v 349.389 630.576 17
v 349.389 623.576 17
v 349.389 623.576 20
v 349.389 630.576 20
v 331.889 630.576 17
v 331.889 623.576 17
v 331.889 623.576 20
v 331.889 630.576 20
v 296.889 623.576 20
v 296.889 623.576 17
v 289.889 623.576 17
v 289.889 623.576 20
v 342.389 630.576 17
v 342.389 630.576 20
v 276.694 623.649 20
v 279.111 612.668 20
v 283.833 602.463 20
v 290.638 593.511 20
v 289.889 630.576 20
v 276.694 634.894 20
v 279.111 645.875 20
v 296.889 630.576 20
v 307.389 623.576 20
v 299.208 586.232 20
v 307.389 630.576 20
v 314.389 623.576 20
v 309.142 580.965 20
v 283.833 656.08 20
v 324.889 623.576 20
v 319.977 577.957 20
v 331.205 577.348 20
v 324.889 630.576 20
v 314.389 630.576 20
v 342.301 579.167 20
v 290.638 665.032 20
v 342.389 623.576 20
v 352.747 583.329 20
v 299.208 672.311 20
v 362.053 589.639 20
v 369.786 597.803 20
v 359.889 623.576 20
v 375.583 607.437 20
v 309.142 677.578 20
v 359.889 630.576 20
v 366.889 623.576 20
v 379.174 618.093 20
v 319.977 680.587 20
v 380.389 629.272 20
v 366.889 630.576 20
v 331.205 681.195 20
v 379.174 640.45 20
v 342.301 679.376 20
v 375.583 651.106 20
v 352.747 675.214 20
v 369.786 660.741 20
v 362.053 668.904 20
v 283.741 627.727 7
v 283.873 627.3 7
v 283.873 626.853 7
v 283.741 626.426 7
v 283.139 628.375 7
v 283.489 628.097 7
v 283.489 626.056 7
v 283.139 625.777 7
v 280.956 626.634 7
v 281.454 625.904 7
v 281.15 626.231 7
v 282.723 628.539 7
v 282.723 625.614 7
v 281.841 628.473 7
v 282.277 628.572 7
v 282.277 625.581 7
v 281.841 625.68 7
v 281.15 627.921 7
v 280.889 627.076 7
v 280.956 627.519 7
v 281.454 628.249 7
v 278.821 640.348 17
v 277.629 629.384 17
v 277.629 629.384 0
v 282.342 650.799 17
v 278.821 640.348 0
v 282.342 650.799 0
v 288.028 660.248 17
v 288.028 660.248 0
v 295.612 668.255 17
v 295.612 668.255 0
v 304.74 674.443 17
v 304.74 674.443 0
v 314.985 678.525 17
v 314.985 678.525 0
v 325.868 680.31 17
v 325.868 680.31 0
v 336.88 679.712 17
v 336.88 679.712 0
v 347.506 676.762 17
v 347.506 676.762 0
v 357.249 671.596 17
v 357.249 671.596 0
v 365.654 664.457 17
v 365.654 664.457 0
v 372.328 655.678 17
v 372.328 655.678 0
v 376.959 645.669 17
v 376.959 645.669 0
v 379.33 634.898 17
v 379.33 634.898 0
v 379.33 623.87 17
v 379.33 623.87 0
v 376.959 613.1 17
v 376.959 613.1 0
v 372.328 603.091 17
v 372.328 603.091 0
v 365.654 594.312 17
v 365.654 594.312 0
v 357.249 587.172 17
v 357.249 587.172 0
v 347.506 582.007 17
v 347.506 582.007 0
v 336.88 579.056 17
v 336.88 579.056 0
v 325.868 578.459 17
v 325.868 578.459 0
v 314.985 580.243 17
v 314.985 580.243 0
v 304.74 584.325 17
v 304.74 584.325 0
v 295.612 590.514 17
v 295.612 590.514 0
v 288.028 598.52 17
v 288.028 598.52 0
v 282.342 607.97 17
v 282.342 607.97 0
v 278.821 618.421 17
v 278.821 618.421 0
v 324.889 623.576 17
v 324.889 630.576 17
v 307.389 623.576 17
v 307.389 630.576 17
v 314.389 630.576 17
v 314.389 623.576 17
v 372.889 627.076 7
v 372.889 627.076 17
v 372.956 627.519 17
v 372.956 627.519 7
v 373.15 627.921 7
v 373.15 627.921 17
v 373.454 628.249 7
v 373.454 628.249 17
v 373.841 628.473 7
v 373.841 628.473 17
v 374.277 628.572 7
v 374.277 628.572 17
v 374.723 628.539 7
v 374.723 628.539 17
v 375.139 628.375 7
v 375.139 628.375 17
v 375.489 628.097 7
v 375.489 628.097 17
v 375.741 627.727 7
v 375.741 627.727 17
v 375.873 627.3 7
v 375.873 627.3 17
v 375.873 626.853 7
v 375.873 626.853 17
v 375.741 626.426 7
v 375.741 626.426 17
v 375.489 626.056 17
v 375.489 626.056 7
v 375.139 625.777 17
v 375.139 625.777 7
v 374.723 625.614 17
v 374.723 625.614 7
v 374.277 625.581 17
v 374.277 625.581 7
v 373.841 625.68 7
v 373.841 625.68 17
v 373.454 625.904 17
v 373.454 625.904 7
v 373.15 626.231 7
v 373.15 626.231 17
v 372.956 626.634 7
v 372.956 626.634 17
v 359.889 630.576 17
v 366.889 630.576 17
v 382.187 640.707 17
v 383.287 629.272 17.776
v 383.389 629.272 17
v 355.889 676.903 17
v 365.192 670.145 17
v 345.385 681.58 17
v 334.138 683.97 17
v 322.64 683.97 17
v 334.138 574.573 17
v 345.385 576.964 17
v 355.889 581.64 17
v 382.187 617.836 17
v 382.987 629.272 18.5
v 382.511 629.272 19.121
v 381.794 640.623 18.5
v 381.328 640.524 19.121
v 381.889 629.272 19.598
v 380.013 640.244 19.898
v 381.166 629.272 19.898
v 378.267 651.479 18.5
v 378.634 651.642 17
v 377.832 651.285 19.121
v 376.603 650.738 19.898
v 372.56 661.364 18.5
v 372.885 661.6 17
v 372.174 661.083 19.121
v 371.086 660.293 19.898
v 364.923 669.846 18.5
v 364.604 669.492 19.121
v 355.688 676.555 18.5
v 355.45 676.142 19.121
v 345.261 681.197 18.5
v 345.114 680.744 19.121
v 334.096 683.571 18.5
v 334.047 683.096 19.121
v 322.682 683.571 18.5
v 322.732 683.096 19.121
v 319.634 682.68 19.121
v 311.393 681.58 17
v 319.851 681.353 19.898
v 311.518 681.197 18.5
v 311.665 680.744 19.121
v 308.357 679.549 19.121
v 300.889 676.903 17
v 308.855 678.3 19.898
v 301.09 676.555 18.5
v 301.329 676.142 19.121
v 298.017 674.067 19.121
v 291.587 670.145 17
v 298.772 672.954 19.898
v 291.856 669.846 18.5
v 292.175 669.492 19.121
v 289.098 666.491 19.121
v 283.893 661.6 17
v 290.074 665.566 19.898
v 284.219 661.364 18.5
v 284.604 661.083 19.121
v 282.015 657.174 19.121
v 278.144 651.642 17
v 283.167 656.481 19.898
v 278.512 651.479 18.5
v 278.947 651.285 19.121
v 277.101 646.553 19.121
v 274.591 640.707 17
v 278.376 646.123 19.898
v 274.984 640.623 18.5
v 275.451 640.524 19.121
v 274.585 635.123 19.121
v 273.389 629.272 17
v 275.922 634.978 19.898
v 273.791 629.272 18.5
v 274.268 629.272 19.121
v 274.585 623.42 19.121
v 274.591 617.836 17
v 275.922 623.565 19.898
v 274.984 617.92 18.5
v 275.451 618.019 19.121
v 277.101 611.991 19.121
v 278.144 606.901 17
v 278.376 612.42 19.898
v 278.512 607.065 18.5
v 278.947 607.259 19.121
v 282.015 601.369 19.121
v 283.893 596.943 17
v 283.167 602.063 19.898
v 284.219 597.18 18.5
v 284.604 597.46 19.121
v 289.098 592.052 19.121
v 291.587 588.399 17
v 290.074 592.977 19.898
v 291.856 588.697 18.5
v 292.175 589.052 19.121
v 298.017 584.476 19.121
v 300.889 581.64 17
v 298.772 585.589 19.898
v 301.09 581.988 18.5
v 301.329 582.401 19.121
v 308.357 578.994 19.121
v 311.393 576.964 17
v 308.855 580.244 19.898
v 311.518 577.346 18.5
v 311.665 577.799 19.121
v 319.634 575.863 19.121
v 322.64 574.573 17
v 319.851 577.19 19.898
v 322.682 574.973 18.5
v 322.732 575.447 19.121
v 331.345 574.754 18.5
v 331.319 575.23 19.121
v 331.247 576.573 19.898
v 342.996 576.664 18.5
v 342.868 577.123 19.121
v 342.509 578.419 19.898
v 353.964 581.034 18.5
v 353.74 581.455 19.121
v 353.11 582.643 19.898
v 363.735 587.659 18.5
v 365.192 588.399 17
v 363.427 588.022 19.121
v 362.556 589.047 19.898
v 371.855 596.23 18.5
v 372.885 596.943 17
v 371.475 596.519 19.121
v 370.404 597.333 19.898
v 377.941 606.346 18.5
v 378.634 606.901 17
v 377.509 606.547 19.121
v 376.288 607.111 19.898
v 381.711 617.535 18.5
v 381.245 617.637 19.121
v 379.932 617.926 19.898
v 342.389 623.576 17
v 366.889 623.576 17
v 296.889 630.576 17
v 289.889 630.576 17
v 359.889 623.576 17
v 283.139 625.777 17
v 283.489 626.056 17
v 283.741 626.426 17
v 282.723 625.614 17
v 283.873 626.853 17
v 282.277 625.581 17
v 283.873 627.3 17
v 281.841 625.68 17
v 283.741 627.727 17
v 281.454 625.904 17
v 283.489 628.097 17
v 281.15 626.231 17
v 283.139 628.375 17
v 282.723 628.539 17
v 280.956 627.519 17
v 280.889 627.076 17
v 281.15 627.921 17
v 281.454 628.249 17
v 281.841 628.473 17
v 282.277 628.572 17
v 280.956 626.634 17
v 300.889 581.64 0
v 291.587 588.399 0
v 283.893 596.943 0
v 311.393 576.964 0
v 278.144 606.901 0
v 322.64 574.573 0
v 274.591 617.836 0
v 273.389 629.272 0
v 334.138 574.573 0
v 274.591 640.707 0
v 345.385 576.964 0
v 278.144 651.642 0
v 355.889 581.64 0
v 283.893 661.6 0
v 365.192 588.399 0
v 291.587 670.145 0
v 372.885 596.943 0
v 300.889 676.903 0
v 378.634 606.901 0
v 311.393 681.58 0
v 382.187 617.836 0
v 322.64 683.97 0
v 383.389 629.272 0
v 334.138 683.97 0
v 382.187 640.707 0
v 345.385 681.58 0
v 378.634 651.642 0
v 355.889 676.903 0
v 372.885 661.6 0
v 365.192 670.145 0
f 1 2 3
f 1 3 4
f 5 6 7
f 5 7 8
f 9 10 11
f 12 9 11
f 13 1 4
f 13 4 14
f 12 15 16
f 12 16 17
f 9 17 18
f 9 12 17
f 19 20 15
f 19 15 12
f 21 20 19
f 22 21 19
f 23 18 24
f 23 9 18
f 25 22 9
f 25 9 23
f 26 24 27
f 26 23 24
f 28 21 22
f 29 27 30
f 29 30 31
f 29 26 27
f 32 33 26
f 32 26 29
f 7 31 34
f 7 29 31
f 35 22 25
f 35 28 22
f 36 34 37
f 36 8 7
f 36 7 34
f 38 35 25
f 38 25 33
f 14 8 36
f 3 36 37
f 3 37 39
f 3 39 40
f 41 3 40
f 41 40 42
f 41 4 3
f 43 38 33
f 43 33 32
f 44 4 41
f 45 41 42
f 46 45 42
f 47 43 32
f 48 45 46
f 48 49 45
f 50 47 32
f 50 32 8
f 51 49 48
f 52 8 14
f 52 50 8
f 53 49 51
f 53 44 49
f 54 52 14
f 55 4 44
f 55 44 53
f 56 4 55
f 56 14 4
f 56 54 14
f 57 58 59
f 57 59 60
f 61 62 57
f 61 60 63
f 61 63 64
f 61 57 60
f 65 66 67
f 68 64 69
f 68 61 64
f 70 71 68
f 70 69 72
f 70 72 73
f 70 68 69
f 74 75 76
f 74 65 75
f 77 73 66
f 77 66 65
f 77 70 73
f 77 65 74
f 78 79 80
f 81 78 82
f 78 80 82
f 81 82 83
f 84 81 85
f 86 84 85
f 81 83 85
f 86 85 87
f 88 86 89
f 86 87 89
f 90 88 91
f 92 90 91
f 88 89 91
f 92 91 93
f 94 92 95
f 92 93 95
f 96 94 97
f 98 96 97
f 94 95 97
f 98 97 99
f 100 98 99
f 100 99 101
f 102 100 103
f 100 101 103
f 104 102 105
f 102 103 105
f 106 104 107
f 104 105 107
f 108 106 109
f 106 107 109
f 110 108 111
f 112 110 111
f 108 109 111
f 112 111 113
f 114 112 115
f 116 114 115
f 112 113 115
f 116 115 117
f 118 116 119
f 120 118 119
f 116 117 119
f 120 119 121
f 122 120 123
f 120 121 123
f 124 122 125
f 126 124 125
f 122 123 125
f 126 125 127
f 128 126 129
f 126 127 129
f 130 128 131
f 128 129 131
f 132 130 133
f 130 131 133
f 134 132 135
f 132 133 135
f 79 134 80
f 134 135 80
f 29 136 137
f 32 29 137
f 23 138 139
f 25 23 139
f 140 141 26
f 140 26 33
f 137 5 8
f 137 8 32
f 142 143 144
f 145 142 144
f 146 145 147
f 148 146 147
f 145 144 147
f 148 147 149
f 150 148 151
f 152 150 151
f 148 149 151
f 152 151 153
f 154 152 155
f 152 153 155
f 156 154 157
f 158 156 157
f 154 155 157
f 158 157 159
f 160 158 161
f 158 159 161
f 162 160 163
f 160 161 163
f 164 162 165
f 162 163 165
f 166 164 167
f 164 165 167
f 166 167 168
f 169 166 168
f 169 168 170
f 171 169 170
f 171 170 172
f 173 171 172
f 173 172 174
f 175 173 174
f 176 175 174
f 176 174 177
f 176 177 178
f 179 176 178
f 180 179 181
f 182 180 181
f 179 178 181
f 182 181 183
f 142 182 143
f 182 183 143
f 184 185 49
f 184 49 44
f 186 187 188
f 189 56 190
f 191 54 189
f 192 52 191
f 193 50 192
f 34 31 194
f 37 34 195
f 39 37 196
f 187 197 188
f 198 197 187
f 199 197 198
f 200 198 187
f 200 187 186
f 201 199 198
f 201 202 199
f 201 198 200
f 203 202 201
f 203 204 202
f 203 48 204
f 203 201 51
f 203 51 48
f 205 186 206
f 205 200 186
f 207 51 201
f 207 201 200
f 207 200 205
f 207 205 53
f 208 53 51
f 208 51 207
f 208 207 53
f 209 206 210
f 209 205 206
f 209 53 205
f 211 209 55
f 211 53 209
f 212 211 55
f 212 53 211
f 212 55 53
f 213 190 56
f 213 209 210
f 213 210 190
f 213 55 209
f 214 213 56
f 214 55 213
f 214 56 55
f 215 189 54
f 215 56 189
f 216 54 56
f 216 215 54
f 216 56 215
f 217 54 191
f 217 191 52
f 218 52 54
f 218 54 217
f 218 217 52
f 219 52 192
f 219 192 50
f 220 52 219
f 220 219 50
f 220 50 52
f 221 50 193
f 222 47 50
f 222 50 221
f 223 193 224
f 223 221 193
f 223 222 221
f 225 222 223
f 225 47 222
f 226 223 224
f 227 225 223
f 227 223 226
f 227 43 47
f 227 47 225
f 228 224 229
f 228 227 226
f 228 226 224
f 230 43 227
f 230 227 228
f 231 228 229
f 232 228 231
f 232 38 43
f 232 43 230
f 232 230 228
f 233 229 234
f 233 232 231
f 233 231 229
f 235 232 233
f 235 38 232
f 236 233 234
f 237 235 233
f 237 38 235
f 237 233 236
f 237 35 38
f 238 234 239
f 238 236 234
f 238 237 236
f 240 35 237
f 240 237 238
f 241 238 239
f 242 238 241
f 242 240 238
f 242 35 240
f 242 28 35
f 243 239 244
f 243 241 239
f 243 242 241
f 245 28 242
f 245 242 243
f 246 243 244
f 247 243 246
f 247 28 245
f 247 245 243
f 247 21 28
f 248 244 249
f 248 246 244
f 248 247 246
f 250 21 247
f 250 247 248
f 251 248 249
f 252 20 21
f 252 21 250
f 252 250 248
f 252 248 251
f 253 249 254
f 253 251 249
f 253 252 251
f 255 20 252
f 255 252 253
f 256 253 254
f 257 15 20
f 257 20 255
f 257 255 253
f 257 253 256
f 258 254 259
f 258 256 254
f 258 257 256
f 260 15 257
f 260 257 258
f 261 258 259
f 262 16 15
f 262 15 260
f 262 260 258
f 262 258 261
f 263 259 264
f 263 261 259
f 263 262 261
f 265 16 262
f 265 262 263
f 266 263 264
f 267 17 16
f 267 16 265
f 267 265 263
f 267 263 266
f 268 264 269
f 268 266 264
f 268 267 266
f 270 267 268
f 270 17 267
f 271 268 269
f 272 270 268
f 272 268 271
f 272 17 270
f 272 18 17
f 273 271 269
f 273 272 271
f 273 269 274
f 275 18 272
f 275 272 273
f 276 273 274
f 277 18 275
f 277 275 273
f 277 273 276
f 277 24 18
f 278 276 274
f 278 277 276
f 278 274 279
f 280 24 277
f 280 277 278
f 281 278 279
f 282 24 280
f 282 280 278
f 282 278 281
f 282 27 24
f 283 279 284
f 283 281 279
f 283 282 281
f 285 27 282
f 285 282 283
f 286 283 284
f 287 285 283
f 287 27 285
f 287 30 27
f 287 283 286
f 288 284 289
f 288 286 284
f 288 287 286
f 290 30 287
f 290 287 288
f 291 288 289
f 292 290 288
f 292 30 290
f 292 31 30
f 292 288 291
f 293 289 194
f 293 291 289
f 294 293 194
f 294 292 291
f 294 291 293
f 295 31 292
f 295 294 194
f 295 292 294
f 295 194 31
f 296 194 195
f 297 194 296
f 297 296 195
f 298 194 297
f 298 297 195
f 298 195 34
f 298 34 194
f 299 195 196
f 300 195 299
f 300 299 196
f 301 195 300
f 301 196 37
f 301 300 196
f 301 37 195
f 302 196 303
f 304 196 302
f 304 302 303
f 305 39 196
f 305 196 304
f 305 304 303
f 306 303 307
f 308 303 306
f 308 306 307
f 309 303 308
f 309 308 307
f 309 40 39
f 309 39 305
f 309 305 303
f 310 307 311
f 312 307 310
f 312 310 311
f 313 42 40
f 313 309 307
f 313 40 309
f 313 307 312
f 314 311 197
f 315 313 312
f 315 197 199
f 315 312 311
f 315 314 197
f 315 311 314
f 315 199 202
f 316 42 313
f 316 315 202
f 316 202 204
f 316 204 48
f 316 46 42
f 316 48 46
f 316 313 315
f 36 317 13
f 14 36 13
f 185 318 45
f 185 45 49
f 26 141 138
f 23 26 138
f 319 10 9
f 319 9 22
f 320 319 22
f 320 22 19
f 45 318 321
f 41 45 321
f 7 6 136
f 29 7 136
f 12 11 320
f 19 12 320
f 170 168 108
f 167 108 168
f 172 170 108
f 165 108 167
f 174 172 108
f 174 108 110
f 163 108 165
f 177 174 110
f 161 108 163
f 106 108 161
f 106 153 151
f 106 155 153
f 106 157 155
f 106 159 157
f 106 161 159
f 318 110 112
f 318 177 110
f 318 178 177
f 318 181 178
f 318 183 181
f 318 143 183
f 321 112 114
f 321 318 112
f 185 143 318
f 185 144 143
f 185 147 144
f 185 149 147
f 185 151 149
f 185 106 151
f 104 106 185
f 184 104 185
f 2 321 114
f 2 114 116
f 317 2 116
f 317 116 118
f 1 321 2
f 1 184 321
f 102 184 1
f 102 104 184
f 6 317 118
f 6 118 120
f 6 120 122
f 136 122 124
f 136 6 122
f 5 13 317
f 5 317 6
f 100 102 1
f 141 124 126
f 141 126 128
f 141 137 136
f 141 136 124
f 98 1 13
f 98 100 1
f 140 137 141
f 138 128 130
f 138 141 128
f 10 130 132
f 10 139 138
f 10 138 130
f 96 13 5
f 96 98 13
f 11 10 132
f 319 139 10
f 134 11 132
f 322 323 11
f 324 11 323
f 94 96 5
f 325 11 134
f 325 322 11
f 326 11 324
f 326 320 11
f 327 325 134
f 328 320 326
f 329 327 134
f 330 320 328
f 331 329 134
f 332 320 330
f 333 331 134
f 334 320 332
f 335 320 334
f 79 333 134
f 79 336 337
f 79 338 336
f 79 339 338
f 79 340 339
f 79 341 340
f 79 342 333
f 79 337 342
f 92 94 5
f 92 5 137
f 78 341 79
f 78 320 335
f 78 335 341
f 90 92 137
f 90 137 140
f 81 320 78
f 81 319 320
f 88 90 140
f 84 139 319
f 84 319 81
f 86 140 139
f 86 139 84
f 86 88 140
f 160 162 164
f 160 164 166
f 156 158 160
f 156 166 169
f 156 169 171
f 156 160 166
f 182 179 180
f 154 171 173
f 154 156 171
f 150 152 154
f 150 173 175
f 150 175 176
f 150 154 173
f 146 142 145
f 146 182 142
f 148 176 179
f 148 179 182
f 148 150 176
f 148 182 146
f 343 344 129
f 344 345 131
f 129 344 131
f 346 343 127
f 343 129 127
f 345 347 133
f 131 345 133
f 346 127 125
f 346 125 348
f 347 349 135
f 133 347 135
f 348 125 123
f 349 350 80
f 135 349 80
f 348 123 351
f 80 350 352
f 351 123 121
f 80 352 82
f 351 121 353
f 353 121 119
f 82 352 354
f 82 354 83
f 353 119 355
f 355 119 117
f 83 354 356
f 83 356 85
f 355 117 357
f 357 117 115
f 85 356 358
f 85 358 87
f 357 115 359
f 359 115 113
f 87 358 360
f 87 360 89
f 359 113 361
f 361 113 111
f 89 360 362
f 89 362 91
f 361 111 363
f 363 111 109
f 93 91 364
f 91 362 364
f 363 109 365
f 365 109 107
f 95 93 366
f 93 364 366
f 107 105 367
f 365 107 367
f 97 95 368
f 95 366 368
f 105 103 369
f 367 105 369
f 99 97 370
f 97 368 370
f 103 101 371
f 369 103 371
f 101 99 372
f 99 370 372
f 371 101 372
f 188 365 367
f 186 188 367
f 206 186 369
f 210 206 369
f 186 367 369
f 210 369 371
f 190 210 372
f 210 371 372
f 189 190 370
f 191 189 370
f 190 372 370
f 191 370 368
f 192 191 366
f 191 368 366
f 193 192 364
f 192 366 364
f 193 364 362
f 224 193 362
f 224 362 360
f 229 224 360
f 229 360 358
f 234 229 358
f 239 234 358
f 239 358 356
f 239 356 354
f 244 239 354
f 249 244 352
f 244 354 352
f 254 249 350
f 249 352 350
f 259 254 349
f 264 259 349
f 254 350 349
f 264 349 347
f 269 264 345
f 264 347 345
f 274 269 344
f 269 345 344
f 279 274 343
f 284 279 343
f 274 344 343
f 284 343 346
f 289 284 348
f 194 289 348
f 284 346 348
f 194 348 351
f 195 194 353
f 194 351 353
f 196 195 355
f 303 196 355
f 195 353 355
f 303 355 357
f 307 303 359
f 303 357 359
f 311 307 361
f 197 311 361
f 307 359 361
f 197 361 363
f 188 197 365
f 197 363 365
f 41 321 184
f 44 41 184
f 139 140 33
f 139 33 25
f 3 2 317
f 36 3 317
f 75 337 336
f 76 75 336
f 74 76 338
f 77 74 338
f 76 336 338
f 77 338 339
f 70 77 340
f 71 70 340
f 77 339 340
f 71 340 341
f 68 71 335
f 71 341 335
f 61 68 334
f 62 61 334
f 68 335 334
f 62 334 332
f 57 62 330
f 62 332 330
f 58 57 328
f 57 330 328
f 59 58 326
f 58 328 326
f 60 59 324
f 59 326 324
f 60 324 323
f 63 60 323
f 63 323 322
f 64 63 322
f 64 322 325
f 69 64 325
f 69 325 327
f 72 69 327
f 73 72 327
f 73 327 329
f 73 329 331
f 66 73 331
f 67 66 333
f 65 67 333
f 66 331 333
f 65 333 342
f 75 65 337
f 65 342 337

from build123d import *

# Parameters (mm, degrees)
SKETCH1_R           = 55
BOSS_EXTRUDE2_DEPTH = 20
SKETCH2_R           = 51
CUT_EXTRUDE1_DEPTH  = 17
SKETCH10_R          = 1.5
BOSS_EXTRUDE3_DEPTH = 10
SKETCH10_3_W        = 7
SKETCH10_3_H        = 7
CUT_EXTRUDE4_DEPTH  = 10
FILLET1_R           = 3


with BuildPart() as part:
    # Sketch1 → Boss-Extrude2 (new body)
    with BuildSketch(Plane.XY):
        with Locations((328.389379834, 629.271631436)):
            Circle(SKETCH1_R)
    extrude(amount=BOSS_EXTRUDE2_DEPTH)

    # Sketch2 → Cut-Extrude1 (cut)
    with BuildSketch(Plane(origin=(0, 0, 0), x_dir=(-1, 0, 0), z_dir=(0, 0, -1))):
        with Locations((-328.628637891, 629.384320649)):
            Circle(SKETCH2_R)
    extrude(amount=-CUT_EXTRUDE1_DEPTH, mode=Mode.SUBTRACT)

    # Sketch10 → Boss-Extrude3 (add)
    with BuildSketch(Plane(origin=(0, 0, 17), x_dir=(-1, 0, 0), z_dir=(0, 0, -1))):
        with Locations((-374.389379834, 627.076422512)):
            Circle(SKETCH10_R)
        with Locations((-282.389379834, 627.076422512)):
            Circle(SKETCH10_R)
    extrude(amount=BOSS_EXTRUDE3_DEPTH)

    # Sketch10<3> → Cut-Extrude4 (cut)
    with BuildSketch(Plane(origin=(0, 0, 17), x_dir=(-1, 0, 0), z_dir=(0, 0, -1))):
        with Locations((-328.389379834, 627.076422512)):
            Rectangle(SKETCH10_3_W, SKETCH10_3_H)
        with Locations((-310.889379834, 627.076422512)):
            Rectangle(SKETCH10_3_W, SKETCH10_3_H)
        with Locations((-293.389379834, 627.076422512)):
            Rectangle(SKETCH10_3_W, SKETCH10_3_H)
        with Locations((-345.889379834, 627.076422512)):
            Rectangle(SKETCH10_3_W, SKETCH10_3_H)
        with Locations((-363.389379834, 627.076422512)):
            Rectangle(SKETCH10_3_W, SKETCH10_3_H)
    extrude(amount=-CUT_EXTRUDE4_DEPTH, mode=Mode.SUBTRACT)

    # Fillet1
    fillet1_edges = [part.edges().sort_by_distance(p)[0] for p in [
        (273.389379834, 629.271631436, 20),
    ]]
    fillet(fillet1_edges, radius=FILLET1_R)


solid = part.part
